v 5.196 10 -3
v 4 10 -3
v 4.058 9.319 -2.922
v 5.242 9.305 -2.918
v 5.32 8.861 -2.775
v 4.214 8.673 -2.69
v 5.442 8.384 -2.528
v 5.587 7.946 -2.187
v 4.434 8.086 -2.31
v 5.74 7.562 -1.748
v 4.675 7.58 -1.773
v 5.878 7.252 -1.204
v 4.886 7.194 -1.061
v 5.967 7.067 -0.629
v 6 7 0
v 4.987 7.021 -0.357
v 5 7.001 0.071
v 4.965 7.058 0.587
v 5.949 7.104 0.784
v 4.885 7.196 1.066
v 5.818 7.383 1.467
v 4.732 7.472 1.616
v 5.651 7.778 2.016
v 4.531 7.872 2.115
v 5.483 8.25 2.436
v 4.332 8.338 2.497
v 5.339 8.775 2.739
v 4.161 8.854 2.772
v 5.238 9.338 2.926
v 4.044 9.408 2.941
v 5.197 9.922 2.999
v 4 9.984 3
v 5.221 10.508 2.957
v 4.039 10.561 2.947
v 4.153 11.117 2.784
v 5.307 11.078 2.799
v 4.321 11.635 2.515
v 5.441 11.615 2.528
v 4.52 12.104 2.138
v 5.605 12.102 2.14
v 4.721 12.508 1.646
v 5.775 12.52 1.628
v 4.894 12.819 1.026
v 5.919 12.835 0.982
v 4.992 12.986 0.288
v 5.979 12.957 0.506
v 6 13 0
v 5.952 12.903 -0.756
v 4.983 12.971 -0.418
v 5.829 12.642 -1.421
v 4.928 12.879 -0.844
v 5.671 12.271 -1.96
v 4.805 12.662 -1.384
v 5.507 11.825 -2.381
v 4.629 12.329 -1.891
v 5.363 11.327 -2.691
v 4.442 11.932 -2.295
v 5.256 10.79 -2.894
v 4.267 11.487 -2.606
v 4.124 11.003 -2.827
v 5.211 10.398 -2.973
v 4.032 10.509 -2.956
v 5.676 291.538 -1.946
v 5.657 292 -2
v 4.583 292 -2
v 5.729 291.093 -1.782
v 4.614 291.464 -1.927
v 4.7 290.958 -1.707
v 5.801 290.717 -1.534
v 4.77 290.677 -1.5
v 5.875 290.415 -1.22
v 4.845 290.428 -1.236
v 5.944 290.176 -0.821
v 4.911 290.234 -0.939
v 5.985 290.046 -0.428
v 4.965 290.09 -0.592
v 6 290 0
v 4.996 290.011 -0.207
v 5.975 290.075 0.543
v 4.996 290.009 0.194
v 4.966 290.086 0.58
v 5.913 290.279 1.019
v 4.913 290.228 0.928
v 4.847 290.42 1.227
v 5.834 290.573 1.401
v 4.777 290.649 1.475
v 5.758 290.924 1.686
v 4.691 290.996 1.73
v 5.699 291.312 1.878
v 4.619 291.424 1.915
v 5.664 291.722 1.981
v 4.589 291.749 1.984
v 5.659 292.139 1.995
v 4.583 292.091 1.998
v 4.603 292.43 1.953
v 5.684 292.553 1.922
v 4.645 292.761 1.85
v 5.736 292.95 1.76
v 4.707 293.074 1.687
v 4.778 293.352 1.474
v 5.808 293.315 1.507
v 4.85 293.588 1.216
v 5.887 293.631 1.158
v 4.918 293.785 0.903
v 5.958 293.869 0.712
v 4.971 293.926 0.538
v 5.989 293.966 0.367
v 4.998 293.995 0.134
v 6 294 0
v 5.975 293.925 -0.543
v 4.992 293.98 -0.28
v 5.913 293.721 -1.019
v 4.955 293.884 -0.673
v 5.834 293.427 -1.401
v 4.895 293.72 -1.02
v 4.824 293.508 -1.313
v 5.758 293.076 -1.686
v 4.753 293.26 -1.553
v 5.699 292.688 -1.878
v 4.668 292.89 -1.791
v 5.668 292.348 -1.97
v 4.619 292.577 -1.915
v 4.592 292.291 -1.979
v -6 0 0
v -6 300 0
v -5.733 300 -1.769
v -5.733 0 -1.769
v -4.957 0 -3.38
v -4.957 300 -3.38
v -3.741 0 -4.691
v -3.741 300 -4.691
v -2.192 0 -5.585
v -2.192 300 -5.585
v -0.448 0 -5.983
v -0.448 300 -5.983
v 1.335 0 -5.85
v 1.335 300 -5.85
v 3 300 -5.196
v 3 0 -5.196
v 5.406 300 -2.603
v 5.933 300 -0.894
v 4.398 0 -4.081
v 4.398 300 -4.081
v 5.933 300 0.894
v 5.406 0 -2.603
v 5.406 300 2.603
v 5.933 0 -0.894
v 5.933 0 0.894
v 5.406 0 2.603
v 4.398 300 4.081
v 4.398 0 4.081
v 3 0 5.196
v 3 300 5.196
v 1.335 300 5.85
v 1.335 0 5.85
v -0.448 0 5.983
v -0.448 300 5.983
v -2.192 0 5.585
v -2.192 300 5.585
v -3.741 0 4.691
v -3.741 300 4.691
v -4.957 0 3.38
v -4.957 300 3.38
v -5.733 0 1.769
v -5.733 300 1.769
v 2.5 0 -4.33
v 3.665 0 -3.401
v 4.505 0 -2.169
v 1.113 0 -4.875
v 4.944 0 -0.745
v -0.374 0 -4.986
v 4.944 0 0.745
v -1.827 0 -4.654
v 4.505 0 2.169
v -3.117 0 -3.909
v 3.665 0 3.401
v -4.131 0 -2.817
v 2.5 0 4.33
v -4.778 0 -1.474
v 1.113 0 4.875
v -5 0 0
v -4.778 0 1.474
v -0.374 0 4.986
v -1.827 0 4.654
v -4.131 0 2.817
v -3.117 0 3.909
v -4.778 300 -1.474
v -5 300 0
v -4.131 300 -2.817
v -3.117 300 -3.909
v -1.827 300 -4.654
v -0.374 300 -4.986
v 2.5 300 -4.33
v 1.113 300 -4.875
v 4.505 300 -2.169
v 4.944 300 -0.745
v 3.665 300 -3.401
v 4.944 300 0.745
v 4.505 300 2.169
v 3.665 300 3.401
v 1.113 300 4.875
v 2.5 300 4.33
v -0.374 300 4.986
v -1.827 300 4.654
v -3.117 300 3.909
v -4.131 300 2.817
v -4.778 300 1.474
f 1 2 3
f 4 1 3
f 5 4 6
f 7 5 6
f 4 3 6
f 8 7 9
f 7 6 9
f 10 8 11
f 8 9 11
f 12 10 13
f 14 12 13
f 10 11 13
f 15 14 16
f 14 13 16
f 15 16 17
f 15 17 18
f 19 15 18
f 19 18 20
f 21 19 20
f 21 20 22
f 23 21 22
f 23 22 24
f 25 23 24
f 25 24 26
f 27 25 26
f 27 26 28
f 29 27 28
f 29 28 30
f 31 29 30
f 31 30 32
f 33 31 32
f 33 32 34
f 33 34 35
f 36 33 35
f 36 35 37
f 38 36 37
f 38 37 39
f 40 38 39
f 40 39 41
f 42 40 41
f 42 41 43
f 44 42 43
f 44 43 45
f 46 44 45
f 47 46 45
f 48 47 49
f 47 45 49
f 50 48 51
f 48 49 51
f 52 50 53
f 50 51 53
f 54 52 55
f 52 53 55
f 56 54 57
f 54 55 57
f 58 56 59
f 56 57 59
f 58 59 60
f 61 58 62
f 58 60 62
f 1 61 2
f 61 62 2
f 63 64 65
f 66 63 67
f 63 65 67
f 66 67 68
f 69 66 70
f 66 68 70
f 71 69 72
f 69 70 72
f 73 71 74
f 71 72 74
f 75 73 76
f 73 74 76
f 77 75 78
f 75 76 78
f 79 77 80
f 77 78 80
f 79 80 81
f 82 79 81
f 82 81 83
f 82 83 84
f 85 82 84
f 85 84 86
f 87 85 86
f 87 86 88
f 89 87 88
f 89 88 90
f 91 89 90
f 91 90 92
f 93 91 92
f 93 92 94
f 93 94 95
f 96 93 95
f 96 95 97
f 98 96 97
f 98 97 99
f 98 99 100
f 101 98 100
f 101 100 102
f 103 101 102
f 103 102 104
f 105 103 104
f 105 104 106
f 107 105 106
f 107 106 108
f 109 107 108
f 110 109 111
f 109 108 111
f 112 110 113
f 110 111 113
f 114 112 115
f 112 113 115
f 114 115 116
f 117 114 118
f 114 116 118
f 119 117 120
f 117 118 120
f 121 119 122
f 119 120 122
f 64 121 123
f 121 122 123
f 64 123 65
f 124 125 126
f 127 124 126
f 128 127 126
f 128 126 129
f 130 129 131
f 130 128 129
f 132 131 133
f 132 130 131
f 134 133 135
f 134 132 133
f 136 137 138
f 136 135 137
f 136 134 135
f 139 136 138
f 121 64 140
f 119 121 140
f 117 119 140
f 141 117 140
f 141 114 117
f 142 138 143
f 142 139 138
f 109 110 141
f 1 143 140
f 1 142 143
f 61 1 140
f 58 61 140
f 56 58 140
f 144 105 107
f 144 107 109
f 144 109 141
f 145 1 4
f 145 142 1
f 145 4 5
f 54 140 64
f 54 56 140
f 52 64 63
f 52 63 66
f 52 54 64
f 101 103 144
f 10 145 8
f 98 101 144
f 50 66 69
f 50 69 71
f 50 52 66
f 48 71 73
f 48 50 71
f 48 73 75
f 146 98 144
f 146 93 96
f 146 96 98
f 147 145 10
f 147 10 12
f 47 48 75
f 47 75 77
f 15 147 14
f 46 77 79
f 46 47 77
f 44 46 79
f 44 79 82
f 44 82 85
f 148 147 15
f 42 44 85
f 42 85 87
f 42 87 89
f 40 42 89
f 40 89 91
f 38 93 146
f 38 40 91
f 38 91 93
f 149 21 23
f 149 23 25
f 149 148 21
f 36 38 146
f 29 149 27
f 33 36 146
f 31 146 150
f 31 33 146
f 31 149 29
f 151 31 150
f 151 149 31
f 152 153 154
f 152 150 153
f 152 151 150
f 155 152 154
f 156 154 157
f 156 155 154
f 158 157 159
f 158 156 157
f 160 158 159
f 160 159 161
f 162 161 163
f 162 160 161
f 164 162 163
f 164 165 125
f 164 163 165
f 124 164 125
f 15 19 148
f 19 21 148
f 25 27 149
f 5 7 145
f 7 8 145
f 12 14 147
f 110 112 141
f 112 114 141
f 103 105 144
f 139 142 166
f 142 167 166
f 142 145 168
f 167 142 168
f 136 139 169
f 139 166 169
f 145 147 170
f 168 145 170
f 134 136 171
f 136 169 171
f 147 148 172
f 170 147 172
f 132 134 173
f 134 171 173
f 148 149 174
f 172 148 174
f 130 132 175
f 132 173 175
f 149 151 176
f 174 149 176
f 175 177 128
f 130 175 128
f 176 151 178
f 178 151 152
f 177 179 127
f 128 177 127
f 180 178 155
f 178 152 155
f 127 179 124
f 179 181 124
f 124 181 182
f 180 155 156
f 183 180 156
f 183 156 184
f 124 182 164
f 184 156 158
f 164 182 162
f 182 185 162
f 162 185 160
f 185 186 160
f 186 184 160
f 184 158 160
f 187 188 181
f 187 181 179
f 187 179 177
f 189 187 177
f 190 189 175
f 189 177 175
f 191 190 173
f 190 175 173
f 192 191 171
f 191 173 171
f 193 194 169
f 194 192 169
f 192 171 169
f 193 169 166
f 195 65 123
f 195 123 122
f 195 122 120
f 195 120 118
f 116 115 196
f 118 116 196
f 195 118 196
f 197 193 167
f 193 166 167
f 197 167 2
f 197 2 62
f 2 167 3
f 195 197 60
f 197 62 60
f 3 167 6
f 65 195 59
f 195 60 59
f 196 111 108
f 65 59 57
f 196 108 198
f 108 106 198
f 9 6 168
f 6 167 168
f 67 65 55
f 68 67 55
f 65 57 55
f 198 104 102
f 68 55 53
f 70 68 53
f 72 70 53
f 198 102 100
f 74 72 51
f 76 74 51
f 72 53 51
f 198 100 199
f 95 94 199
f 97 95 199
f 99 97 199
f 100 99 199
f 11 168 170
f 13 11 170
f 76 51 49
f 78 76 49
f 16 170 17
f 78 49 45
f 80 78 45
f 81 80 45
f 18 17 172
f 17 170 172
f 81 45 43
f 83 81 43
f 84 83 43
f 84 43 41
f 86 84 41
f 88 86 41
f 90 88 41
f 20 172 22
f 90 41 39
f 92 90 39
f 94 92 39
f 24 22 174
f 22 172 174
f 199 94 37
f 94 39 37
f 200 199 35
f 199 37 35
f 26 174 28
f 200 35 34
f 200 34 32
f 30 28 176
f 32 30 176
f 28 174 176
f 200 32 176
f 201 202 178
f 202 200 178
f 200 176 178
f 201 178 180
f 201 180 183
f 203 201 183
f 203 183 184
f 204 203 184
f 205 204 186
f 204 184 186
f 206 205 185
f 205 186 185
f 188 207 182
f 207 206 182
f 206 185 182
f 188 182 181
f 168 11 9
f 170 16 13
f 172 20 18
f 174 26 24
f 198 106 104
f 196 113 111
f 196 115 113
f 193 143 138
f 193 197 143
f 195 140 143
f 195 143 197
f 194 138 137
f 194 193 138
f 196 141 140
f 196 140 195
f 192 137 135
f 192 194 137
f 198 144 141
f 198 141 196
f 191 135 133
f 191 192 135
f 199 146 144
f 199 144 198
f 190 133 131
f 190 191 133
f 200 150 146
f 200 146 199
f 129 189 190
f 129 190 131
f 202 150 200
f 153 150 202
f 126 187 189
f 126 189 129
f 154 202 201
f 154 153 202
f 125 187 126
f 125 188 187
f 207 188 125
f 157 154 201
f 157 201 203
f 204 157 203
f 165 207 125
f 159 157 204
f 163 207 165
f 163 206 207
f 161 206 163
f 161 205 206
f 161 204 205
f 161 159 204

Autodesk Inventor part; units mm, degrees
ref_plane "XZ Plane" through (0, 0, 0) normal (0, 1, 0) x (-1, 0, 0)
ref_plane "XY Plane" through (0, 0, 0) normal (0, 0, 1) x (1, 0, 0)
sketch "Sketch1" plane through (0, 0, 0) normal (0, 1, 0) x (-1, 0, 0)
  circle A0 centre (0, 0) radius 5
  circle A1 centre (0, 0) radius 6
  dimension "d0" = 12
  dimension "d1" = 1
extrude "Extrusion1" add sketch "Sketch1" along normal blind 300
ref_plane "Work Plane3" through (6, 0, 0) normal (1, 0, 0) x (0, 1, 0)
sketch "Sketch2" plane through (6, 0, 0) normal (1, 0, 0) x (0, 1, 0)
  line L0 (0, -6) -> (300, -6) projected
  line L1 (0, 6) -> (300, 6) projected
  line L2 (300, -6) -> (300, 6) projected
  line L3 (-60, 0) -> (360, 0) projected
  point P0 (0, 0)
  point P1 (10, 0)
  point P2 (292, 0)
  point P3 (300, 0)
  dimension "d20" = 10
  dimension "d21" = 8
hole "Hole1" at (6, 10, 0) direction (-1, 0, 0) diameter 6 end up to surface
hole "Hole2" at (6, 292, 0) direction (-1, 0, 0) diameter 4 end up to surface
equation "\"d2\" = pipe_length"
equation "\"pipe_length\" = 300"
properties part number "pipe" material "Aluminum 6061"
